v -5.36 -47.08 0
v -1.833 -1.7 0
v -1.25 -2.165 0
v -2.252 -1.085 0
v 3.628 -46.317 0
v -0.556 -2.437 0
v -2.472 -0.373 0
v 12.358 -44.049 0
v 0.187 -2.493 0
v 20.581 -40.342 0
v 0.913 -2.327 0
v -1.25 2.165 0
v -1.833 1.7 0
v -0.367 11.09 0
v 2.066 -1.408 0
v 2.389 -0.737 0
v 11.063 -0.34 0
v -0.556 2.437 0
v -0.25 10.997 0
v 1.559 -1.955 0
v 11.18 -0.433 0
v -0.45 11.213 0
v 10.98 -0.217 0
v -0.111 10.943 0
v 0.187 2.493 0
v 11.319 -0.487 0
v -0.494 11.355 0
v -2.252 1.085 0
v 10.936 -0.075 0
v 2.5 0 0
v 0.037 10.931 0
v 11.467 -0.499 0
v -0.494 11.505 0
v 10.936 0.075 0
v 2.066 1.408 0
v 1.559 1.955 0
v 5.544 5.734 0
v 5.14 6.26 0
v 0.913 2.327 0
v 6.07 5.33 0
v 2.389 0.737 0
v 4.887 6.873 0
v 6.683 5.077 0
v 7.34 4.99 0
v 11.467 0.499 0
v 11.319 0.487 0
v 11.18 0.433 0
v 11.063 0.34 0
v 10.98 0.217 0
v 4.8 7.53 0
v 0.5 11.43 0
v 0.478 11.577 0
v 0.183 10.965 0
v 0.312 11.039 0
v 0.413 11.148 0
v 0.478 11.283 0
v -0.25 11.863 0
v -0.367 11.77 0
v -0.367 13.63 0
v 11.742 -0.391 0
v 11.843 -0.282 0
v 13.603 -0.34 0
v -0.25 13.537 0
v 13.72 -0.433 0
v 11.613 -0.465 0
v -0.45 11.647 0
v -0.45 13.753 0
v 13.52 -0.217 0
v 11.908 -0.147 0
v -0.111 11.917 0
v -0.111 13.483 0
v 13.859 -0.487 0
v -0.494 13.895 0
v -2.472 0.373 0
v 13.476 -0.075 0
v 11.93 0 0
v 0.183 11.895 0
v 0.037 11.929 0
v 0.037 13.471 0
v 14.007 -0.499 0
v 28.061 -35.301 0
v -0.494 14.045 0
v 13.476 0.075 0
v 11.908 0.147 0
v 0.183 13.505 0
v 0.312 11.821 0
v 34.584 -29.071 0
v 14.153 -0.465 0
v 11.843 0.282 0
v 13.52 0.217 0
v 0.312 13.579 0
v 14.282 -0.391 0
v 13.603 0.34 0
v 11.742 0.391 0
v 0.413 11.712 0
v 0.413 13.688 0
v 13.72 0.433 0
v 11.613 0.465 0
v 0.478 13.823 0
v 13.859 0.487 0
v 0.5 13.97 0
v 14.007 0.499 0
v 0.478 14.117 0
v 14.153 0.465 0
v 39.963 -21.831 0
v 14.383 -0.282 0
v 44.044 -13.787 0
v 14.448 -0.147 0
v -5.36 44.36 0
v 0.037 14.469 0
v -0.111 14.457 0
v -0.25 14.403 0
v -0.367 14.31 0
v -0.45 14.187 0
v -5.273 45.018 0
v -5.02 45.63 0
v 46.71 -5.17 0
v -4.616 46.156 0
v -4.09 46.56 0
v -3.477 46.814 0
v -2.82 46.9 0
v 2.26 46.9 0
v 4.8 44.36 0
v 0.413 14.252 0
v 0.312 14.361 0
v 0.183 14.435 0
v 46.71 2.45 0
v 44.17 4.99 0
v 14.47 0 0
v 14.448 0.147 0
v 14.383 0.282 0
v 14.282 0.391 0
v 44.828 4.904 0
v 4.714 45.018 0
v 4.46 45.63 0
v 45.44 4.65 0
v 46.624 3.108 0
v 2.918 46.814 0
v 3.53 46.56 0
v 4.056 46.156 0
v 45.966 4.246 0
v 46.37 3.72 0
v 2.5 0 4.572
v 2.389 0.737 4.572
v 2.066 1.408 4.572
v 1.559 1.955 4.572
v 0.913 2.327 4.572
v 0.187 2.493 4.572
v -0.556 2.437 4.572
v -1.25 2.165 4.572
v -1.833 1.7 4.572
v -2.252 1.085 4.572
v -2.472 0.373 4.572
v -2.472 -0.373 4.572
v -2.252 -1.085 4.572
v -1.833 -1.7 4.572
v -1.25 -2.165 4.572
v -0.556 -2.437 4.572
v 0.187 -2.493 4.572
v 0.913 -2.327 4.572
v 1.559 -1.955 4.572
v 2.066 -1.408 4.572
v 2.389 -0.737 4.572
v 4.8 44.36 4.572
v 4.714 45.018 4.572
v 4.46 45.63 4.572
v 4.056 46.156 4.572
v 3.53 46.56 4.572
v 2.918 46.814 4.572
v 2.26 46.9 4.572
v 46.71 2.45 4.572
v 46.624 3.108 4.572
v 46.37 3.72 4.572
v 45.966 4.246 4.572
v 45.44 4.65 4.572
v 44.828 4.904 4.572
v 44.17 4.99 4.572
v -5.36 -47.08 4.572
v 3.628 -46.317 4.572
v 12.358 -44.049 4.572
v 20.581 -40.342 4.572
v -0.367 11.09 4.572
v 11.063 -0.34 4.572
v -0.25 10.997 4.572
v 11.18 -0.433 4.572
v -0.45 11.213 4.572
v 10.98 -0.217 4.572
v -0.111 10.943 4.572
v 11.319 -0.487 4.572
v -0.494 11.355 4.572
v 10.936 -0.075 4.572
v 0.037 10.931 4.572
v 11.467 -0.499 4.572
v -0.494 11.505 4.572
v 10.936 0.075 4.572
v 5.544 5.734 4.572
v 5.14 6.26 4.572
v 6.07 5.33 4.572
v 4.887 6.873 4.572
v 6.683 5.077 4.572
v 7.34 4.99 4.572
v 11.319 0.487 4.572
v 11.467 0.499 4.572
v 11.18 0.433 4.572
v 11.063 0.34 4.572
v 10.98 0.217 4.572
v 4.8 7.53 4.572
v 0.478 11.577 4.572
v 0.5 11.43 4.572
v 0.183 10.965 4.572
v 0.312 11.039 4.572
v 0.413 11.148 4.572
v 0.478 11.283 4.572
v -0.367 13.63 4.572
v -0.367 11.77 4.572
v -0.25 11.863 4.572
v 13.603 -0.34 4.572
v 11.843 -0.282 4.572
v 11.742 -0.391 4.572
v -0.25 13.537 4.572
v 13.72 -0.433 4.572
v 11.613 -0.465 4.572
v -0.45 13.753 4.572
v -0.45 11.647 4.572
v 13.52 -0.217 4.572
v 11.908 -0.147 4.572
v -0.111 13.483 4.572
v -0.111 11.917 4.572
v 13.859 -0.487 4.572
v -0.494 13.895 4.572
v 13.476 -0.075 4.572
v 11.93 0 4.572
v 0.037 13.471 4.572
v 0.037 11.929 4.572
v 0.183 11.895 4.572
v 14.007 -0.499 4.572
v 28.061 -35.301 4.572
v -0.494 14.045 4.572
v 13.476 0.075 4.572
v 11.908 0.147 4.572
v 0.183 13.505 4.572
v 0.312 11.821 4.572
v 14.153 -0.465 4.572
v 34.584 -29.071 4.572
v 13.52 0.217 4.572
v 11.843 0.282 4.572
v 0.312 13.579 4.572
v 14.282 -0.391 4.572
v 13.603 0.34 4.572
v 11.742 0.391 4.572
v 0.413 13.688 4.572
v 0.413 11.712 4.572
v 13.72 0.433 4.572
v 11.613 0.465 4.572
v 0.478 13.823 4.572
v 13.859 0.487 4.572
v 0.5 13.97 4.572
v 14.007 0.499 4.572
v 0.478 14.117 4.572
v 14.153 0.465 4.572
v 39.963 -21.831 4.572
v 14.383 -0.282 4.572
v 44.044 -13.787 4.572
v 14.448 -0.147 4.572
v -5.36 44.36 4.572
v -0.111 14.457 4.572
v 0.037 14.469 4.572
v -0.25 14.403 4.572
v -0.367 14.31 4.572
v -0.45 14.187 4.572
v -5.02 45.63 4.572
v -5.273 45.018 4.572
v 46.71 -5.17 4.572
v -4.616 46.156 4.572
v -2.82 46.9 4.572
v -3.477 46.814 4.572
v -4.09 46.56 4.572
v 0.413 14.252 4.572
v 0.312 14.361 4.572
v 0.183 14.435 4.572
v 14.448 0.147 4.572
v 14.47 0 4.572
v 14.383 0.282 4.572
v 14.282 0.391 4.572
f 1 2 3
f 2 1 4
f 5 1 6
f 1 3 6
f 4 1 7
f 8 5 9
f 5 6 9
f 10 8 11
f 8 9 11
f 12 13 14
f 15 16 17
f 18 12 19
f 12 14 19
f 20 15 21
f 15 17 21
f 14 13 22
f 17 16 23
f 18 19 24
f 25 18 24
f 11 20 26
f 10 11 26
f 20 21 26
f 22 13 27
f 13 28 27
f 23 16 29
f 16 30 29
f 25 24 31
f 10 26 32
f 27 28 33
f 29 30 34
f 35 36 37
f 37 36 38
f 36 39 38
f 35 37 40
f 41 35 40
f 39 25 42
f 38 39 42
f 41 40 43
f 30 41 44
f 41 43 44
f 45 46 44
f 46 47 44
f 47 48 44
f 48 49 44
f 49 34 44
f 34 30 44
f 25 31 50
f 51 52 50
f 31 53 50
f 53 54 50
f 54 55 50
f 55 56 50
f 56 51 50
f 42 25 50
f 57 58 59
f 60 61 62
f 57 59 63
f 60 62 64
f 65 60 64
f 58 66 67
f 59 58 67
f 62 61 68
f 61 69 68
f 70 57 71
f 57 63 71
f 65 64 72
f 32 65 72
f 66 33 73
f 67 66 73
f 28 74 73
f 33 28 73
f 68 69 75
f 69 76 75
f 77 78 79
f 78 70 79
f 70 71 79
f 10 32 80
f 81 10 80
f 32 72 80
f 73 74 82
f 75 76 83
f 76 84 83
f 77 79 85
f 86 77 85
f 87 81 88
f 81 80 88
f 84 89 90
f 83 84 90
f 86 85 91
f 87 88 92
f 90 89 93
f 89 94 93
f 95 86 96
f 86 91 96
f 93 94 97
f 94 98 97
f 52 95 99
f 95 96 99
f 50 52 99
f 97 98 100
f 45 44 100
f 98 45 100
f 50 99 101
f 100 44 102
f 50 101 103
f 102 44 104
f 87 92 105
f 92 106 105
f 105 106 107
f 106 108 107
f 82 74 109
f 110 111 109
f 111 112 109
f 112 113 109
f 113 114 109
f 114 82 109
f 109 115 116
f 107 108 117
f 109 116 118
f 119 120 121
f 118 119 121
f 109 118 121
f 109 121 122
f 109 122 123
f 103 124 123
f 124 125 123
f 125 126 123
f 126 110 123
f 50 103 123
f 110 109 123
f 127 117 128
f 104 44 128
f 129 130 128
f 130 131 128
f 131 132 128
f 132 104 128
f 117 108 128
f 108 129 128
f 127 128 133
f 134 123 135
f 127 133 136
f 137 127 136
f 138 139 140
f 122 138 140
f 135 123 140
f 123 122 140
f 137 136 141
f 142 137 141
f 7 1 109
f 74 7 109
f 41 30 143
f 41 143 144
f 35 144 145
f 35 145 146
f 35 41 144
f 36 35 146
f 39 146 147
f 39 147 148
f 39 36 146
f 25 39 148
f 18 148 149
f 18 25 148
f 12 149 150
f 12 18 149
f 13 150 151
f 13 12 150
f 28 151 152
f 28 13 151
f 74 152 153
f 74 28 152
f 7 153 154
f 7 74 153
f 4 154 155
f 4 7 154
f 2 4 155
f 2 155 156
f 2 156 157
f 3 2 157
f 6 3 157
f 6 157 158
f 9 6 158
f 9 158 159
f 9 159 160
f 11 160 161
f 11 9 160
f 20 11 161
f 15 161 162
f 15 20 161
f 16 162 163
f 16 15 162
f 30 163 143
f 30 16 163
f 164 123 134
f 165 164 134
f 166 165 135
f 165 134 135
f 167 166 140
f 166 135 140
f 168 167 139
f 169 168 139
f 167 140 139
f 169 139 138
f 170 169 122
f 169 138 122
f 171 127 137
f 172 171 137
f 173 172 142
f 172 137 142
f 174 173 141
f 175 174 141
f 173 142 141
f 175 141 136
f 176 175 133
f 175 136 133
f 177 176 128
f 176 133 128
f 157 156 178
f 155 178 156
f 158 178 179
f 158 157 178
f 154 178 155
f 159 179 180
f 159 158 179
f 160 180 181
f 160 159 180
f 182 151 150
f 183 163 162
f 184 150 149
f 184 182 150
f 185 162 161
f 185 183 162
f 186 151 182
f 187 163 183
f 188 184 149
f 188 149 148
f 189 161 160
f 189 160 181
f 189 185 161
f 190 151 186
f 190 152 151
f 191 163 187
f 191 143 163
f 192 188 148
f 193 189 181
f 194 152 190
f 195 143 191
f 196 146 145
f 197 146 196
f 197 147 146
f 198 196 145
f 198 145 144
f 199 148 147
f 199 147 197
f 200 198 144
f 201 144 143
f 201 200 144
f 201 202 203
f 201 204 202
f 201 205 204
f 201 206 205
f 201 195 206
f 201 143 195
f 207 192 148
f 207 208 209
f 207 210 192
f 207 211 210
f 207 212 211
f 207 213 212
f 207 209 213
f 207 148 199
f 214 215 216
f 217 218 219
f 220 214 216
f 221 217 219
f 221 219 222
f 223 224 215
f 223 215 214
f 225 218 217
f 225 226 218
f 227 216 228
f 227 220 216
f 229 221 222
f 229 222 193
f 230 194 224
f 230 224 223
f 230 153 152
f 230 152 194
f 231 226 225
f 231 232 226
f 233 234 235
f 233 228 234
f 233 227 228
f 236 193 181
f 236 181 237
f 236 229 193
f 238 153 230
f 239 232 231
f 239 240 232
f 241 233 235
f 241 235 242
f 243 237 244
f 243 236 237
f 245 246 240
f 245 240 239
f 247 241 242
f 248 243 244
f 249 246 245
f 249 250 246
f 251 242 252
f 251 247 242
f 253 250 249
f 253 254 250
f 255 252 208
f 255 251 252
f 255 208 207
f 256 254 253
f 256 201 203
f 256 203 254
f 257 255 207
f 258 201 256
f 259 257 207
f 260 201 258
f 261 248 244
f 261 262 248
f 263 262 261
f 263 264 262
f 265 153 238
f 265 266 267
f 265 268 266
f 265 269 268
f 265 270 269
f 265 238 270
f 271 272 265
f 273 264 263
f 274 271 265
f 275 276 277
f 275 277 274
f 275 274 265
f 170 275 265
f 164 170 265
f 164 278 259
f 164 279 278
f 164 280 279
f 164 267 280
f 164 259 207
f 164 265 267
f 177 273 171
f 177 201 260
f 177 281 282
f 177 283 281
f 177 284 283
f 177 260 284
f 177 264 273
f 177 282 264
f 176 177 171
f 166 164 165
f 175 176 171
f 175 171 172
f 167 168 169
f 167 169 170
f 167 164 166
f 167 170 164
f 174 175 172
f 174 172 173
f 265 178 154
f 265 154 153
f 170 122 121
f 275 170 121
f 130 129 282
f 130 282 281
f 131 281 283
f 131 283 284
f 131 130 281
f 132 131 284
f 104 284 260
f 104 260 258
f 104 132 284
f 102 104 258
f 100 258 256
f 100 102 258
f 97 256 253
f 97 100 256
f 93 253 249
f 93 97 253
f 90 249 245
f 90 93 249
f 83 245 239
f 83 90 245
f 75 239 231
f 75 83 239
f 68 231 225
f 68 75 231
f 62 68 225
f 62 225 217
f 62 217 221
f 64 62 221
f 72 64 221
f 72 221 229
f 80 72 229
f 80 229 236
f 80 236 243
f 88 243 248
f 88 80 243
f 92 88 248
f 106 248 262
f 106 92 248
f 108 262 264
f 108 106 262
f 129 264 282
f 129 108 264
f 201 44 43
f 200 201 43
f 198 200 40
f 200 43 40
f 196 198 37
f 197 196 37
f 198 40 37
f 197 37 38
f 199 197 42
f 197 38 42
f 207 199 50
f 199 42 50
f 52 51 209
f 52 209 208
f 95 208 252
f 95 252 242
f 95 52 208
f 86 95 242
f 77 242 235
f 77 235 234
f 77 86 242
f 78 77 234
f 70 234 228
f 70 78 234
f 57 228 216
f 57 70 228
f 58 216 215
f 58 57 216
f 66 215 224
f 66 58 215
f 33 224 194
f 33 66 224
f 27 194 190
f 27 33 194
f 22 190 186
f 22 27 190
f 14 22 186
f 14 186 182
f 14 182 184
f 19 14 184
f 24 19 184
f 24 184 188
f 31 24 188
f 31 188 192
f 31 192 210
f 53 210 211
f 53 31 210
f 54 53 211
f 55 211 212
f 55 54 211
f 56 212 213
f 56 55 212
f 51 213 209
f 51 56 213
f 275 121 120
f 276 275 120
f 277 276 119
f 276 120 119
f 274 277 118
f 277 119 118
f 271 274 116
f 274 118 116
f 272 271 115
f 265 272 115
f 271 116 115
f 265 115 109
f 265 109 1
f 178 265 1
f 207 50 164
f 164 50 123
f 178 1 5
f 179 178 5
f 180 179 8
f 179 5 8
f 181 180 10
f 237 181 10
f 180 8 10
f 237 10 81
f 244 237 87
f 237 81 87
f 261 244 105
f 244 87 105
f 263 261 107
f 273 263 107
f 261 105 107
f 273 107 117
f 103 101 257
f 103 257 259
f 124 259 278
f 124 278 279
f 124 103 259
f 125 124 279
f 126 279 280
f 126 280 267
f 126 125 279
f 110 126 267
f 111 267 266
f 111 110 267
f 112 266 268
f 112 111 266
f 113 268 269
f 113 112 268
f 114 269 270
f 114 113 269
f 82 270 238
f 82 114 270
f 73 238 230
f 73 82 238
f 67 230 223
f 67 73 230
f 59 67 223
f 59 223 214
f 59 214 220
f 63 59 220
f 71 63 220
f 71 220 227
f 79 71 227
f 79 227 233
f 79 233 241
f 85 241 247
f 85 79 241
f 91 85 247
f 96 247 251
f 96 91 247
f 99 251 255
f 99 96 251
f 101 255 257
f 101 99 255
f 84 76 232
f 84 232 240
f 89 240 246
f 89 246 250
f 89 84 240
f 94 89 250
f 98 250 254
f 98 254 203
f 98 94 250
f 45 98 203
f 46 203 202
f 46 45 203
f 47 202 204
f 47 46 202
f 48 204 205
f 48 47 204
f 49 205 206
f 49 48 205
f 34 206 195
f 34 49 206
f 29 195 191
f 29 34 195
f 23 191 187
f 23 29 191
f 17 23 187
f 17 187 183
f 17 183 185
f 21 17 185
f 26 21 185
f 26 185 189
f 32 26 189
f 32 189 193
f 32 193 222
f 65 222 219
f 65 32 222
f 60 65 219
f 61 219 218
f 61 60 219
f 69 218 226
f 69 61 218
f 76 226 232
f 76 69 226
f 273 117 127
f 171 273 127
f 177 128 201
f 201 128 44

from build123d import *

# Parameters (mm, degrees)
SKETCH1_R           = 2.5
SKETCH1_R_2         = 0.5
BOSS_EXTRUDE2_DEPTH = 4.572


with BuildPart() as part:
    # Sketch1 → Boss-Extrude2 (new body)
    with BuildSketch(Plane.XY):
        with BuildLine():
            Line((4.800174543, 7.530126516), (4.800174543, 44.360126516))
            ThreePointArc((4.800174543, 44.360126516), (4.056225767, 46.15617774), (2.260174543, 46.900126516))
            Line((2.260174543, 46.900126516), (-2.819825457, 46.900126516))
            ThreePointArc((-2.819825457, 46.900126516), (-4.615876681, 46.15617774), (-5.359825457, 44.360126516))
            Line((-5.359825457, 44.360126516), (-5.359825457, -5.169873484))
            Line((-5.359825457, -5.169873484), (-5.359825457, -47.079873484))
            ThreePointArc((-5.359825457, -47.079873484), (28.060725855, -35.300861478), (46.710174543, -5.169873484))
            Line((46.710174543, -5.169873484), (46.710174543, -2.629873484))
            Line((46.710174543, -2.629873484), (46.710174543, 2.450126516))
            ThreePointArc((46.710174543, 2.450126516), (45.966225767, 4.24617774), (44.170174543, 4.990126516))
            Line((44.170174543, 4.990126516), (7.340174543, 4.990126516))
            ThreePointArc((7.340174543, 4.990126516), (5.544123319, 5.734075291), (4.800174543, 7.530126516))
        make_face()
        Circle(SKETCH1_R, mode=Mode.SUBTRACT)
        with Locations((0, 11.43)):
            Circle(SKETCH1_R_2, mode=Mode.SUBTRACT)
        with Locations((11.43, 0)):
            Circle(SKETCH1_R_2, mode=Mode.SUBTRACT)
        with Locations((0, 13.97)):
            Circle(SKETCH1_R_2, mode=Mode.SUBTRACT)
        with Locations((13.97, 0)):
            Circle(SKETCH1_R_2, mode=Mode.SUBTRACT)
    extrude(amount=BOSS_EXTRUDE2_DEPTH)


solid = part.part
